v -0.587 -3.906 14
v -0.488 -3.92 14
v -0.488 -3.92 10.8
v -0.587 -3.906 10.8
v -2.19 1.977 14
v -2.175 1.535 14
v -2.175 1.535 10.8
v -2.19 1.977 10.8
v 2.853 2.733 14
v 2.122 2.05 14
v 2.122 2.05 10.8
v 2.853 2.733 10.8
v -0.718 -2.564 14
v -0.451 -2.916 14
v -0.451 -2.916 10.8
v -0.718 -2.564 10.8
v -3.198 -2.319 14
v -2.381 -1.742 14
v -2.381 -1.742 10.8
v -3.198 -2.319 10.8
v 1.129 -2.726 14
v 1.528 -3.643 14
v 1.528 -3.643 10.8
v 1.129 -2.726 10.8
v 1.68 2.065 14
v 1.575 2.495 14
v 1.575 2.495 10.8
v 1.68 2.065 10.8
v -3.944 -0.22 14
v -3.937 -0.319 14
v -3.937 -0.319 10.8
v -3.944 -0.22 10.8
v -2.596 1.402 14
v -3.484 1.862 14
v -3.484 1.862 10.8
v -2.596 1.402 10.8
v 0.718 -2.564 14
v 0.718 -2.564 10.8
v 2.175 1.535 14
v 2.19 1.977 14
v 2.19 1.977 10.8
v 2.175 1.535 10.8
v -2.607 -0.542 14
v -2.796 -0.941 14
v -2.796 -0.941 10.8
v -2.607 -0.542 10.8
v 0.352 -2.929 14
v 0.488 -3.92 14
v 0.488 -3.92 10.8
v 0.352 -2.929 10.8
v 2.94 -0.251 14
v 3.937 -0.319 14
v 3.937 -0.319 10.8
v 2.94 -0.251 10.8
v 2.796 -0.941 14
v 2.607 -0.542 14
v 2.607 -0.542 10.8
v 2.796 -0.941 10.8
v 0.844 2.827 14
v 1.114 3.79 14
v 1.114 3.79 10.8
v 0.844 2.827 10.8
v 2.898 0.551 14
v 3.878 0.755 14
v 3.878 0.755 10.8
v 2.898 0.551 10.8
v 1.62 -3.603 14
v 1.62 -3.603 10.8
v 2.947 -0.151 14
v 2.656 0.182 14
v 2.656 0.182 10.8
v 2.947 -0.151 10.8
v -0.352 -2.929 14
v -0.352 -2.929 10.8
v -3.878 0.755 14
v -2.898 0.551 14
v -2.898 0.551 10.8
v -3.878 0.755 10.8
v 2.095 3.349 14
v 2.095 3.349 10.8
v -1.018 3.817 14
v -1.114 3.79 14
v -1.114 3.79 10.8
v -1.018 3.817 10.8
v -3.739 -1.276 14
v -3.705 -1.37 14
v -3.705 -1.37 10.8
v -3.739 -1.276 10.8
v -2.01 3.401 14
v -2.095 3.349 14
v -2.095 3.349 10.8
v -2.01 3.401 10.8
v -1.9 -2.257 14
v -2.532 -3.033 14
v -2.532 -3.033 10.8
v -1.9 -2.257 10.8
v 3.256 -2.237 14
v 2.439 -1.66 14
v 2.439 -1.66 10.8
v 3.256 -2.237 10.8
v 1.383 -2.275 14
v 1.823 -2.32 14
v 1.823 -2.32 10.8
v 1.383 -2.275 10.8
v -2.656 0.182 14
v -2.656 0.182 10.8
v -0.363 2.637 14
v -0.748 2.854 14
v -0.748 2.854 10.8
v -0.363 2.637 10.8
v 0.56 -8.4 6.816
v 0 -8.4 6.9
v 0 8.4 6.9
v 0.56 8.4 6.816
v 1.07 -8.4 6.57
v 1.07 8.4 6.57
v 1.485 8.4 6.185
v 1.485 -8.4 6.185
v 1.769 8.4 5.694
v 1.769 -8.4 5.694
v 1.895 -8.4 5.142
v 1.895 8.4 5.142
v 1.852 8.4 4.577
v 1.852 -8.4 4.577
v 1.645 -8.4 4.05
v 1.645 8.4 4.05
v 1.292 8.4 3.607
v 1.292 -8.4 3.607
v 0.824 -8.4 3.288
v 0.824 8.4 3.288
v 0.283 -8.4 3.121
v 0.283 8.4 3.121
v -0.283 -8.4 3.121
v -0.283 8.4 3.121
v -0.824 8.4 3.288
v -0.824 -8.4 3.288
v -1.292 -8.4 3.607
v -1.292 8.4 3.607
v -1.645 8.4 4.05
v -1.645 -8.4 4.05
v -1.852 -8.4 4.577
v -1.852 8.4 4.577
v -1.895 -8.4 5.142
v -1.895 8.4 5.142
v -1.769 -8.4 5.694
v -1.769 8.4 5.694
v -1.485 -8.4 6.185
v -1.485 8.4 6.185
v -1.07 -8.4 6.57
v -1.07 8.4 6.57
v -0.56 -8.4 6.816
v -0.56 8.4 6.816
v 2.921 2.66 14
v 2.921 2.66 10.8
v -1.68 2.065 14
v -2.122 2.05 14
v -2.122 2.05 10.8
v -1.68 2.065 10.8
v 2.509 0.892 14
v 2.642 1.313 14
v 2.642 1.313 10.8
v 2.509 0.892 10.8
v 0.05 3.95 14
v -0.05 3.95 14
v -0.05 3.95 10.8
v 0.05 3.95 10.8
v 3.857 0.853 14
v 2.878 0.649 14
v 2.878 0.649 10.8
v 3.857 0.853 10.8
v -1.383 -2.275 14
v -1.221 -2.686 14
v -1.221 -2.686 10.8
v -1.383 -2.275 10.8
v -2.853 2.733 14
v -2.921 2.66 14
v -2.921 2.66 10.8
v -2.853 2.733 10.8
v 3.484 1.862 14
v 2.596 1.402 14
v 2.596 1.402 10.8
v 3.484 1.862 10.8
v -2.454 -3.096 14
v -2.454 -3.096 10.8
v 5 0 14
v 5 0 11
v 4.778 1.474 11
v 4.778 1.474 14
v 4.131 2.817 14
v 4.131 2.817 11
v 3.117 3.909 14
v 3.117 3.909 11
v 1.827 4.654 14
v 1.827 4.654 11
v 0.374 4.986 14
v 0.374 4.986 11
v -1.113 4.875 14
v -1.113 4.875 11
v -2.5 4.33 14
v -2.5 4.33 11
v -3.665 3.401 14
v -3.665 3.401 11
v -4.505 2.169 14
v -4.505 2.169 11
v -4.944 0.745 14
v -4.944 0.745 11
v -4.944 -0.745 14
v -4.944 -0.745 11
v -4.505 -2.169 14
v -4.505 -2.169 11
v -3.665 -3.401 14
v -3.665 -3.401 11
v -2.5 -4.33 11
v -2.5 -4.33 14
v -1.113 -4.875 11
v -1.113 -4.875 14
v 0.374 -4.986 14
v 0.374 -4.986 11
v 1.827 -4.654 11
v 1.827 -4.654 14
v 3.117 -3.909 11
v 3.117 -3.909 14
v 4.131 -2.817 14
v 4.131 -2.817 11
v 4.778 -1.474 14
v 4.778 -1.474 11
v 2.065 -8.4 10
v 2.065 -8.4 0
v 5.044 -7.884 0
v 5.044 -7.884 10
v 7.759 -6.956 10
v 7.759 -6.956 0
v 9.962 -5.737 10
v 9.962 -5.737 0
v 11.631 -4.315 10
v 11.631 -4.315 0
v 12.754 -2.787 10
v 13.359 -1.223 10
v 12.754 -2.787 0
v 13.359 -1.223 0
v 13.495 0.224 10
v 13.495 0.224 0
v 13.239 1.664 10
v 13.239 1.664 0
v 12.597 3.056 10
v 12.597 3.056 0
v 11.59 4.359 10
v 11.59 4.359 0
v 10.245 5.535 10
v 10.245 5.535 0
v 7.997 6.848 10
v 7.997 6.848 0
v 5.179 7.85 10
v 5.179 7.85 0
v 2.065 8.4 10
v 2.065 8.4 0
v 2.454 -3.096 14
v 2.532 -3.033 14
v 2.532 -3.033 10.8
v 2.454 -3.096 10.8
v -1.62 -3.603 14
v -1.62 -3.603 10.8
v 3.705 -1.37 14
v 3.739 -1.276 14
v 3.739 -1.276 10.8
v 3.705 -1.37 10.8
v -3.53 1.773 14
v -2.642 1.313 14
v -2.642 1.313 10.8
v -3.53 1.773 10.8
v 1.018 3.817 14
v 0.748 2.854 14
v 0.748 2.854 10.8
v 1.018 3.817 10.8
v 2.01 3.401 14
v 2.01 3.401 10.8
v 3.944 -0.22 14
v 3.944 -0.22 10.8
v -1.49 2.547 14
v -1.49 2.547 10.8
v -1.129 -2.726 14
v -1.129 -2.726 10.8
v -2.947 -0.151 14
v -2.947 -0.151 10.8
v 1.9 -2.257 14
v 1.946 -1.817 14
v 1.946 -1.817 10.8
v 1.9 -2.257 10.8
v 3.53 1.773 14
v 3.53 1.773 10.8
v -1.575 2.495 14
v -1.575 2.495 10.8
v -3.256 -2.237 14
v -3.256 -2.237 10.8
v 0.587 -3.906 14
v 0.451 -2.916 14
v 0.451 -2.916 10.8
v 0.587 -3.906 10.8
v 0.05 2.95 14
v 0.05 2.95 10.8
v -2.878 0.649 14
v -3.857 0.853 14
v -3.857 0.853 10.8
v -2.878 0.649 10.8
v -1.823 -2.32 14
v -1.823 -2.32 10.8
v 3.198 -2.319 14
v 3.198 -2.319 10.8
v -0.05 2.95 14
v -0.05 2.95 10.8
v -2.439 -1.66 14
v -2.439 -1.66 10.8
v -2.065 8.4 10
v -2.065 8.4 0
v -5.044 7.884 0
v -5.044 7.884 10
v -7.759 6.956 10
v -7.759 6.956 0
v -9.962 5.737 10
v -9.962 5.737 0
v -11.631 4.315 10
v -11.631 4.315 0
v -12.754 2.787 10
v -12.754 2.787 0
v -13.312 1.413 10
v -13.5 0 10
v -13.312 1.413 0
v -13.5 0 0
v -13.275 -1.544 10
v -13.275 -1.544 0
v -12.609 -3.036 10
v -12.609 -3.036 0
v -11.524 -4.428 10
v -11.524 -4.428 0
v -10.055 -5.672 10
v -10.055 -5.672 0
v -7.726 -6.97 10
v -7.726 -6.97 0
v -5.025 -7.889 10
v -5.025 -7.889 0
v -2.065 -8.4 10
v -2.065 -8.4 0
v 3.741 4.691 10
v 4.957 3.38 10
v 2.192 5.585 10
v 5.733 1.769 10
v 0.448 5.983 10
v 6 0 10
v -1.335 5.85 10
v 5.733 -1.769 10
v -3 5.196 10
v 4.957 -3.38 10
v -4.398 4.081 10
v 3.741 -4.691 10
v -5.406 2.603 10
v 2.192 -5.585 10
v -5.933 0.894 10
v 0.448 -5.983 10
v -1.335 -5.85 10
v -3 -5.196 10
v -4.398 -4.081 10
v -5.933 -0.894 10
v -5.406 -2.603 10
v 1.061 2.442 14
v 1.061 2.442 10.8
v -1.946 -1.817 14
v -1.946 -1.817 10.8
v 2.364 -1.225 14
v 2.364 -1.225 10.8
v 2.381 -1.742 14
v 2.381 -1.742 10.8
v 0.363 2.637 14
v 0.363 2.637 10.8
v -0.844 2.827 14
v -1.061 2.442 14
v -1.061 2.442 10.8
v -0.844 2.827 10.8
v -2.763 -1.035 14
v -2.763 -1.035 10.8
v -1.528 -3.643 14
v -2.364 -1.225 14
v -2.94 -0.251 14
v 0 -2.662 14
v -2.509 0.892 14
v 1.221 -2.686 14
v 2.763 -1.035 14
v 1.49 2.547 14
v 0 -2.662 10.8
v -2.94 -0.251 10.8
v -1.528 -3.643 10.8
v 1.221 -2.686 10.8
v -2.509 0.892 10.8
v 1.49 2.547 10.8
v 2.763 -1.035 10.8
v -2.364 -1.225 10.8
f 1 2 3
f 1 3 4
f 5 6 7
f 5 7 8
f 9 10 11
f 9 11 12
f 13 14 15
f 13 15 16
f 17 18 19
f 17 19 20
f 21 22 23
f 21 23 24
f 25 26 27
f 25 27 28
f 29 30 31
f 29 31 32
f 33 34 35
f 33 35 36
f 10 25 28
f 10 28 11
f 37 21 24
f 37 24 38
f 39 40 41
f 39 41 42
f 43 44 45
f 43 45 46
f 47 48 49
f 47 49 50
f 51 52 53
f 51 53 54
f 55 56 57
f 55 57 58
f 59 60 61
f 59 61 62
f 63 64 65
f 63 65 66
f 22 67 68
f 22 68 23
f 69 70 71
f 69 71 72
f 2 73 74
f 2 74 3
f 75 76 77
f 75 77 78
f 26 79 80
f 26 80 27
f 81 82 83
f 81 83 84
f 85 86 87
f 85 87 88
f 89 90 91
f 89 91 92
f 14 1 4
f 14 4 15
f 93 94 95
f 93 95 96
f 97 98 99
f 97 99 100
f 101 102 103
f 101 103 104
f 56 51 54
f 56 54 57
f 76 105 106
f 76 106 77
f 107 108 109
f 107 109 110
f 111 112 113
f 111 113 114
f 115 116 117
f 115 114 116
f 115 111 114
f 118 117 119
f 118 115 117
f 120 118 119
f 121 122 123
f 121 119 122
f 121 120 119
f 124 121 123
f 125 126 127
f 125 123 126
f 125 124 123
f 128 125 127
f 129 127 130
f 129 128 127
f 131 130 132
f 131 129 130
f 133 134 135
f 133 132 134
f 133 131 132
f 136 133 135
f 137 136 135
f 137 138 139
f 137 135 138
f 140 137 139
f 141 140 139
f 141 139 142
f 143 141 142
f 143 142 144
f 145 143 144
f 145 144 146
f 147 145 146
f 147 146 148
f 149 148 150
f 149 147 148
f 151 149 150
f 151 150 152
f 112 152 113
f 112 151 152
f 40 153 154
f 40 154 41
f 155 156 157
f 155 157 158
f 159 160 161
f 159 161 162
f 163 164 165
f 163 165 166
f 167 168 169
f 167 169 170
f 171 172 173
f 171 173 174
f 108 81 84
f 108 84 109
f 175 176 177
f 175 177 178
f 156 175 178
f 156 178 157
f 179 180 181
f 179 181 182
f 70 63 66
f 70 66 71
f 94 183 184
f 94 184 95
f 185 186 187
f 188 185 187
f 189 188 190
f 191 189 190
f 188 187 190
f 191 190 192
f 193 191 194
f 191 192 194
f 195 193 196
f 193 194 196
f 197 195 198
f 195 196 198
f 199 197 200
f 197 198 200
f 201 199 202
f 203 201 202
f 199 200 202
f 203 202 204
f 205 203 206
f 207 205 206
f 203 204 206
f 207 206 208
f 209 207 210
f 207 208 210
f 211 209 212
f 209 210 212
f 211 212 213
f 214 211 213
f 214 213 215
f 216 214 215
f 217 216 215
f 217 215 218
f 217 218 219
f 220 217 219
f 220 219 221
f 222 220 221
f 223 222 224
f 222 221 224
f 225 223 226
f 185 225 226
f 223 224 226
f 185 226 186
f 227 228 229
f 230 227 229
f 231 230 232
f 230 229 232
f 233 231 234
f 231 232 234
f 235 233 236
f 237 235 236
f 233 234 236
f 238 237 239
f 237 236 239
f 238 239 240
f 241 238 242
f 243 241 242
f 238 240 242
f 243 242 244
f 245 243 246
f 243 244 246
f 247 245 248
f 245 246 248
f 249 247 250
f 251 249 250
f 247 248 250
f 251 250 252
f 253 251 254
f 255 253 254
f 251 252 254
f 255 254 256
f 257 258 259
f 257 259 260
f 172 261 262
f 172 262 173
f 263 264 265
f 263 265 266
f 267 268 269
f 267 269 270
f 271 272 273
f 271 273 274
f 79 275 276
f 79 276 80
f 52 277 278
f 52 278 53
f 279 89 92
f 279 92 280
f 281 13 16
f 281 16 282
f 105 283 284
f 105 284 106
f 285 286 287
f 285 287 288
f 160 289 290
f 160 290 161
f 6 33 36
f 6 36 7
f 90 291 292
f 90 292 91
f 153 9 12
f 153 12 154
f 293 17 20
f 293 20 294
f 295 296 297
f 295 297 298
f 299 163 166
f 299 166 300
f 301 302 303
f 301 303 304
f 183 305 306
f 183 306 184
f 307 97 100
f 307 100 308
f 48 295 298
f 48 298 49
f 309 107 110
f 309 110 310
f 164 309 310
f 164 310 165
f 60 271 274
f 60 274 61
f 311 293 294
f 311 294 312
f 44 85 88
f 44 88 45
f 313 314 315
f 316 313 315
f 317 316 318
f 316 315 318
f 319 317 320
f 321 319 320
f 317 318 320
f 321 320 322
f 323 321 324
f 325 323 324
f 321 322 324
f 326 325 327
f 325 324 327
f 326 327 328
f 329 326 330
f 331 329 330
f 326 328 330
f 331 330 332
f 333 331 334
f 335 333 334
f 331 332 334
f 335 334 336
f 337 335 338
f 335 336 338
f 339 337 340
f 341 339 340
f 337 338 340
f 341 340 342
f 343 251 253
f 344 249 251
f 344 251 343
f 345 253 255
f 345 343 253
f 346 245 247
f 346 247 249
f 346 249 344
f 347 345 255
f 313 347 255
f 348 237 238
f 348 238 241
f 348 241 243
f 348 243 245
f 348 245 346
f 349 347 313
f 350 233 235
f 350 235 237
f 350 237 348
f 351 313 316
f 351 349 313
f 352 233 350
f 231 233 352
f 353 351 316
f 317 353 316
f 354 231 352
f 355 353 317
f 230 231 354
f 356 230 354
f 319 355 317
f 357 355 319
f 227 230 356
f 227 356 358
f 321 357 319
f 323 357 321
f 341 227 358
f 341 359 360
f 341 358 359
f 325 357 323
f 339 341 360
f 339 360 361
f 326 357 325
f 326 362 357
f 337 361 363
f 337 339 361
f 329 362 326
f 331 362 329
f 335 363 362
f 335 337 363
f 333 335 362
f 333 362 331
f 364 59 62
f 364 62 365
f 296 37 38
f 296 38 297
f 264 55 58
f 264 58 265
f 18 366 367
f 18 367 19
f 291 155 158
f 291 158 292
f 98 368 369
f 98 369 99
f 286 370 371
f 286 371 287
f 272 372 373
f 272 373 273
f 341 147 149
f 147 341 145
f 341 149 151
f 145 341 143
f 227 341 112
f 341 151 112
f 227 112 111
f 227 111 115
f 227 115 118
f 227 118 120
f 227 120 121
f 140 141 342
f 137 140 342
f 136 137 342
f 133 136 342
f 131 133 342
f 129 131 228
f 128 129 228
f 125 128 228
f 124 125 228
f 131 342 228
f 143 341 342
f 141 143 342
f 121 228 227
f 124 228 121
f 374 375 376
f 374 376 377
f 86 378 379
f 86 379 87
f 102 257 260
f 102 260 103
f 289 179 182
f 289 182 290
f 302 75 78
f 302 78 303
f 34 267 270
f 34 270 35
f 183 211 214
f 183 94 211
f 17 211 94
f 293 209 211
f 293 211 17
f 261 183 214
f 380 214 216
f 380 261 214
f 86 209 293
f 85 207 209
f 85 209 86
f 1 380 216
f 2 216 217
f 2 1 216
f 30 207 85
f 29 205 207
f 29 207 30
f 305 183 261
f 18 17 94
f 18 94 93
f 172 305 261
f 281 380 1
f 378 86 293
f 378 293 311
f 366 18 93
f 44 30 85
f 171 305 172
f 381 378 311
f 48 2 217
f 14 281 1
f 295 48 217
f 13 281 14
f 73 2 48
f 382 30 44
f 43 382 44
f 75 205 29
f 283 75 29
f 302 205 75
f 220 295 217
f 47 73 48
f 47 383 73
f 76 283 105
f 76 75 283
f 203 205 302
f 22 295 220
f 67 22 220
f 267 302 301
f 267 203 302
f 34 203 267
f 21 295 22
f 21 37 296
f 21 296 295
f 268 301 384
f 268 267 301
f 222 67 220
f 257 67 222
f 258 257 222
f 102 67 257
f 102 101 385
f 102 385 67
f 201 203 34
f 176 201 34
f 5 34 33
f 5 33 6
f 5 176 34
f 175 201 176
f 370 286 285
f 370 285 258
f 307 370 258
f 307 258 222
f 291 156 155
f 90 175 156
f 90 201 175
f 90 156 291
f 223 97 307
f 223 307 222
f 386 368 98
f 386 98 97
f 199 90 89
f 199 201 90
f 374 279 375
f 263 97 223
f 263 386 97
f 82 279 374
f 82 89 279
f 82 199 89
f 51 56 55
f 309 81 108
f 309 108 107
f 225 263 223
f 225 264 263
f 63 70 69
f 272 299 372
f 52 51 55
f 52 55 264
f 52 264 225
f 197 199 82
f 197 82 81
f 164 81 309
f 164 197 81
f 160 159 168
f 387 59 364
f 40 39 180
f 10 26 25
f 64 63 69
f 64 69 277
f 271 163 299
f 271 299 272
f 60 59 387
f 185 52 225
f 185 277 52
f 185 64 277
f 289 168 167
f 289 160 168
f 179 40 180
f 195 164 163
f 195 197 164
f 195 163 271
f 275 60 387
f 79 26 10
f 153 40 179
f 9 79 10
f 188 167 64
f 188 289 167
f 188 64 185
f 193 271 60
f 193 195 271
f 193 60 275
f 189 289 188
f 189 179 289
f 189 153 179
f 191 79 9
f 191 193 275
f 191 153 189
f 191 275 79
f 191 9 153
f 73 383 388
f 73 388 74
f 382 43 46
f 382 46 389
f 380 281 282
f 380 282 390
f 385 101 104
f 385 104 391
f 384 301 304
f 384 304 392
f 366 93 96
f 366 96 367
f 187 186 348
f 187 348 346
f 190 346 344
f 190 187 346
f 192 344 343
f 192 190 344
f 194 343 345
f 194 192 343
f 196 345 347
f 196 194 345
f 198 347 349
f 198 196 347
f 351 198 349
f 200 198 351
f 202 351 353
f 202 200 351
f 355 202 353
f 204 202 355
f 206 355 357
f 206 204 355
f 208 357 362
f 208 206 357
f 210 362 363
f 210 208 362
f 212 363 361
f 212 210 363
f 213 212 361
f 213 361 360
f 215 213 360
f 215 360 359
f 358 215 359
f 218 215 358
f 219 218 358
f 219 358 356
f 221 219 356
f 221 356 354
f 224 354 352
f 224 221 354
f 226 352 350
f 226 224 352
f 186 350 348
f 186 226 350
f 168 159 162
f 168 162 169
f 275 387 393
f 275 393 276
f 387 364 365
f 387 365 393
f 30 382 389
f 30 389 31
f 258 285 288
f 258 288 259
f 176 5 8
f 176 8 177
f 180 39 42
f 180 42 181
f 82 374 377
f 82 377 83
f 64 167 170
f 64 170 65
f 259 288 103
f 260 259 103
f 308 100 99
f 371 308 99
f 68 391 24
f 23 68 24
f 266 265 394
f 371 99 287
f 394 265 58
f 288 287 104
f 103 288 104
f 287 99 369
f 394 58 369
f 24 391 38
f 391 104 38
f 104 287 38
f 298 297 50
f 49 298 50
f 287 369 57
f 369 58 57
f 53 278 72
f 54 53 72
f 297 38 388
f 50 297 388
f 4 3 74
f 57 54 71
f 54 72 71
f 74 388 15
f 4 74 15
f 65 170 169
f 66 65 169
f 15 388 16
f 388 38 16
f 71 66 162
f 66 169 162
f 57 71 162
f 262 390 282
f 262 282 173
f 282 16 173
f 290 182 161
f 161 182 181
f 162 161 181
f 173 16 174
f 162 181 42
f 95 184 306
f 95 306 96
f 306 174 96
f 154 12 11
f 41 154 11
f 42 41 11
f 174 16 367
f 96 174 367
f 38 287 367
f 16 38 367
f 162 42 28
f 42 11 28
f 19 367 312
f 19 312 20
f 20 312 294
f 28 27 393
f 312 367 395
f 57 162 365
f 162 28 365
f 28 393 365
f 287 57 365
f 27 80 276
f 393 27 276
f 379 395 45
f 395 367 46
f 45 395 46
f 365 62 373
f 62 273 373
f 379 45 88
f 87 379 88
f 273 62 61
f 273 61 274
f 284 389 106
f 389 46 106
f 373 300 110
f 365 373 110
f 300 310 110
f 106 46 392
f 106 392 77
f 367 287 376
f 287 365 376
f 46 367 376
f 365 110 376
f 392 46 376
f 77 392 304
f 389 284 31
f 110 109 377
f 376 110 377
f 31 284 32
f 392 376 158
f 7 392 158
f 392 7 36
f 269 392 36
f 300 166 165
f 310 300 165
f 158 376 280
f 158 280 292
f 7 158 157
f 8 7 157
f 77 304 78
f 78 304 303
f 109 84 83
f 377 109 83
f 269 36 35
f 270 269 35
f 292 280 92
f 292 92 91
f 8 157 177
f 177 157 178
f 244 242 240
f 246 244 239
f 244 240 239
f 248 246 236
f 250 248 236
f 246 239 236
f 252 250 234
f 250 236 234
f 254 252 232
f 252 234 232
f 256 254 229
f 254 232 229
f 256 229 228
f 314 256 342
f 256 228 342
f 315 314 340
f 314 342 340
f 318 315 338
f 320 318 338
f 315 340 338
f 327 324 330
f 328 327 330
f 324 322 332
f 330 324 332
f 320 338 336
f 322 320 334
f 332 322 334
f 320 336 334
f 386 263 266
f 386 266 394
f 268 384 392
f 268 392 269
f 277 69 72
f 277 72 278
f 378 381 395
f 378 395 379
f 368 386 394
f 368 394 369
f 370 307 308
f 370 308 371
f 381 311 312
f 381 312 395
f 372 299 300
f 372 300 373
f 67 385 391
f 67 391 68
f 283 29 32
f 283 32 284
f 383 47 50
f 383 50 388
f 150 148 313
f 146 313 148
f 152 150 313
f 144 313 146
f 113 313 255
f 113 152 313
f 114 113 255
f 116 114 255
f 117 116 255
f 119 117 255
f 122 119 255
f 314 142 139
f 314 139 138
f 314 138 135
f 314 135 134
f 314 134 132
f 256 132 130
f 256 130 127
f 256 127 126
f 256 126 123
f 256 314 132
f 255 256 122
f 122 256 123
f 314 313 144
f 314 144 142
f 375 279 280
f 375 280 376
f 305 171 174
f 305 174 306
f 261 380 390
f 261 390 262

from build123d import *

# Parameters (mm, degrees)
SKETCH_1_RX              = 13.5
SKETCH_1_RY              = 8.5
EXTRUDE_1_DEPTH          = 10
CUT_EXTRUDE_START        = 18.4
SKETCH_2_W               = 5
SKETCH_2_H               = 16.987350845
CUT_EXTRUDE_2_DEPTH      = 10
CUT_EXTRUDE_3_DEPTH      = 24.758998465
CUT_EXTRUDE_3_DEPTH_BACK = 24.758998465
SKETCH_3_R               = 1.9
SKETCH_6_R               = 5
EXTRUDE_3_DEPTH          = 4
CUT_EXTRUDE_5_DEPTH      = 3.2
CHAMFER_1_SIZE           = 1


with BuildPart() as part:
    # ｽｹｯﾁ1 → ﾎﾞｽ - 押し出し1 (new body)
    with BuildSketch(Plane.XY):
        with Locations(Location((0, 0), (0, 0, 180))):
            Ellipse(SKETCH_1_RX, SKETCH_1_RY)
    extrude(amount=EXTRUDE_1_DEPTH)

    # ｽｹｯﾁ2 → ｶｯﾄ - 押し出し2 (cut)
    with BuildSketch(Plane(origin=(0, 0, 0), x_dir=(1, 0, 0), z_dir=(0, 1, 0)).offset(CUT_EXTRUDE_START)):
        with Locations((0, -4.794388707)):
            Rectangle(SKETCH_2_W, SKETCH_2_H)
    cut_extrude_2 = extrude(amount=-CUT_EXTRUDE_2_DEPTH, mode=Mode.SUBTRACT)

    # ﾐﾗｰ1: ｶｯﾄ - 押し出し2 across plane
    add(cut_extrude_2.mirror(Plane.ZX), mode=Mode.SUBTRACT)

    # ｽｹｯﾁ3 → ｶｯﾄ - 押し出し3 (cut, two sides: drawn at the far end of the back side and taken through both)
    with BuildSketch(Plane(origin=(0, 8.4, 0), x_dir=(1, 0, 0), z_dir=(0, 1, 0)).offset(-CUT_EXTRUDE_3_DEPTH_BACK)):
        with Locations(Location((0, -5, 0), (0, 0, 270))):
            Circle(SKETCH_3_R)
    extrude(amount=CUT_EXTRUDE_3_DEPTH + CUT_EXTRUDE_3_DEPTH_BACK, mode=Mode.SUBTRACT)

    # ｽｹｯﾁ6 → ﾎﾞｽ - 押し出し3 (add)
    with BuildSketch(Plane.XY.offset(10)):
        Circle(SKETCH_6_R)
    extrude(amount=EXTRUDE_3_DEPTH)

    # ｽｹｯﾁ5 → ｶｯﾄ - 押し出し5 (cut)
    with BuildSketch(Plane.XY.offset(14)):
        Polygon((-0.05, 2.95), (-0.05, 3.95), (0.05, 3.95), (0.05, 2.95), (0.362514094, 2.637485906), (0.747754611, 2.854095836), (1.017551382, 3.817013124), (1.11384311, 3.790033446), (0.844046339, 2.827116159), (1.060656269, 2.441875642), (1.490051682, 2.546516441), (2.009635632, 3.400935845), (2.095077573, 3.34897745), (1.575493623, 2.494558046), (1.680134421, 2.065162633), (2.121838437, 2.050073571), (2.852674402, 2.732626714), (2.920929716, 2.659543117), (2.190093752, 1.976989974), (2.17500469, 1.535285958), (2.596258142, 1.401586122), (3.484143361, 1.86165116), (3.530149865, 1.772862638), (2.642264646, 1.3127976), (2.50856481, 0.891544148), (2.878125258, 0.649149443), (3.857209346, 0.852605456), (3.877554947, 0.754697047), (2.898470859, 0.551241034), (2.656076155, 0.181680586), (2.94653499, -0.151431681), (3.944203759, -0.219674094), (3.937379518, -0.319440971), (2.939710748, -0.251198558), (2.606598481, -0.541657393), (2.796413701, -0.94078181), (3.738674623, -1.275661422), (3.705186662, -1.369887514), (2.76292574, -1.035007902), (2.363801323, -1.224823122), (2.4388952, -1.660358456), (3.255865093, -2.237038778), (3.198197061, -2.318735767), (2.381227168, -1.742055445), (1.945691834, -1.817149322), (1.900495, -2.25679391), (2.531582945, -3.032505201), (2.454011816, -3.095613995), (1.822923871, -2.319902705), (1.383279283, -2.274705871), (1.22114378, -2.685853285), (1.61954487, -3.603064586), (1.52782374, -3.642904695), (1.12942265, -2.725693394), (0.718275236, -2.563557891), (0.451225912, -2.915715208), (0.587392561, -3.906401154), (0.488323967, -3.920017819), (0.352157318, -2.929331873), (0, -2.66228255), (-0.352157318, -2.929331873), (-0.488323967, -3.920017819), (-0.587392561, -3.906401154), (-0.451225912, -2.915715208), (-0.718275236, -2.563557891), (-1.12942265, -2.725693394), (-1.52782374, -3.642904695), (-1.61954487, -3.603064586), (-1.22114378, -2.685853285), (-1.383279283, -2.274705871), (-1.822923871, -2.319902705), (-2.454011816, -3.095613995), (-2.531582945, -3.032505201), (-1.900495, -2.25679391), (-1.945691834, -1.817149322), (-2.381227168, -1.742055445), (-3.198197061, -2.318735767), (-3.255865093, -2.237038778), (-2.4388952, -1.660358456), (-2.363801323, -1.224823122), (-2.76292574, -1.035007902), (-3.705186662, -1.369887514), (-3.738674623, -1.275661422), (-2.796413701, -0.94078181), (-2.606598481, -0.541657393), (-2.939710748, -0.251198558), (-3.937379518, -0.319440971), (-3.944203759, -0.219674094), (-2.94653499, -0.151431681), (-2.656076155, 0.181680586), (-2.898470859, 0.551241034), (-3.877554947, 0.754697047), (-3.857209346, 0.852605456), (-2.878125258, 0.649149443), (-2.50856481, 0.891544148), (-2.642264646, 1.3127976), (-3.530149865, 1.772862638), (-3.484143361, 1.86165116), (-2.596258142, 1.401586122), (-2.17500469, 1.535285958), (-2.190093752, 1.976989974), (-2.920929716, 2.659543117), (-2.852674402, 2.732626714), (-2.121838437, 2.050073571), (-1.680134421, 2.065162633), (-1.575493623, 2.494558046), (-2.095077573, 3.34897745), (-2.009635632, 3.400935845), (-1.490051682, 2.546516441), (-1.060656269, 2.441875642), (-0.844046339, 2.827116159), (-1.11384311, 3.790033446), (-1.017551382, 3.817013124), (-0.747754611, 2.854095836), (-0.362514094, 2.637485906), align=None)
    extrude(amount=-CUT_EXTRUDE_5_DEPTH, mode=Mode.SUBTRACT)

    # 面取り1
    chamfer_1_edges = [part.edges().sort_by_distance(p)[0] for p in [
        (-5, 0, 10),
    ]]
    chamfer(chamfer_1_edges, length=CHAMFER_1_SIZE)


solid = part.part
